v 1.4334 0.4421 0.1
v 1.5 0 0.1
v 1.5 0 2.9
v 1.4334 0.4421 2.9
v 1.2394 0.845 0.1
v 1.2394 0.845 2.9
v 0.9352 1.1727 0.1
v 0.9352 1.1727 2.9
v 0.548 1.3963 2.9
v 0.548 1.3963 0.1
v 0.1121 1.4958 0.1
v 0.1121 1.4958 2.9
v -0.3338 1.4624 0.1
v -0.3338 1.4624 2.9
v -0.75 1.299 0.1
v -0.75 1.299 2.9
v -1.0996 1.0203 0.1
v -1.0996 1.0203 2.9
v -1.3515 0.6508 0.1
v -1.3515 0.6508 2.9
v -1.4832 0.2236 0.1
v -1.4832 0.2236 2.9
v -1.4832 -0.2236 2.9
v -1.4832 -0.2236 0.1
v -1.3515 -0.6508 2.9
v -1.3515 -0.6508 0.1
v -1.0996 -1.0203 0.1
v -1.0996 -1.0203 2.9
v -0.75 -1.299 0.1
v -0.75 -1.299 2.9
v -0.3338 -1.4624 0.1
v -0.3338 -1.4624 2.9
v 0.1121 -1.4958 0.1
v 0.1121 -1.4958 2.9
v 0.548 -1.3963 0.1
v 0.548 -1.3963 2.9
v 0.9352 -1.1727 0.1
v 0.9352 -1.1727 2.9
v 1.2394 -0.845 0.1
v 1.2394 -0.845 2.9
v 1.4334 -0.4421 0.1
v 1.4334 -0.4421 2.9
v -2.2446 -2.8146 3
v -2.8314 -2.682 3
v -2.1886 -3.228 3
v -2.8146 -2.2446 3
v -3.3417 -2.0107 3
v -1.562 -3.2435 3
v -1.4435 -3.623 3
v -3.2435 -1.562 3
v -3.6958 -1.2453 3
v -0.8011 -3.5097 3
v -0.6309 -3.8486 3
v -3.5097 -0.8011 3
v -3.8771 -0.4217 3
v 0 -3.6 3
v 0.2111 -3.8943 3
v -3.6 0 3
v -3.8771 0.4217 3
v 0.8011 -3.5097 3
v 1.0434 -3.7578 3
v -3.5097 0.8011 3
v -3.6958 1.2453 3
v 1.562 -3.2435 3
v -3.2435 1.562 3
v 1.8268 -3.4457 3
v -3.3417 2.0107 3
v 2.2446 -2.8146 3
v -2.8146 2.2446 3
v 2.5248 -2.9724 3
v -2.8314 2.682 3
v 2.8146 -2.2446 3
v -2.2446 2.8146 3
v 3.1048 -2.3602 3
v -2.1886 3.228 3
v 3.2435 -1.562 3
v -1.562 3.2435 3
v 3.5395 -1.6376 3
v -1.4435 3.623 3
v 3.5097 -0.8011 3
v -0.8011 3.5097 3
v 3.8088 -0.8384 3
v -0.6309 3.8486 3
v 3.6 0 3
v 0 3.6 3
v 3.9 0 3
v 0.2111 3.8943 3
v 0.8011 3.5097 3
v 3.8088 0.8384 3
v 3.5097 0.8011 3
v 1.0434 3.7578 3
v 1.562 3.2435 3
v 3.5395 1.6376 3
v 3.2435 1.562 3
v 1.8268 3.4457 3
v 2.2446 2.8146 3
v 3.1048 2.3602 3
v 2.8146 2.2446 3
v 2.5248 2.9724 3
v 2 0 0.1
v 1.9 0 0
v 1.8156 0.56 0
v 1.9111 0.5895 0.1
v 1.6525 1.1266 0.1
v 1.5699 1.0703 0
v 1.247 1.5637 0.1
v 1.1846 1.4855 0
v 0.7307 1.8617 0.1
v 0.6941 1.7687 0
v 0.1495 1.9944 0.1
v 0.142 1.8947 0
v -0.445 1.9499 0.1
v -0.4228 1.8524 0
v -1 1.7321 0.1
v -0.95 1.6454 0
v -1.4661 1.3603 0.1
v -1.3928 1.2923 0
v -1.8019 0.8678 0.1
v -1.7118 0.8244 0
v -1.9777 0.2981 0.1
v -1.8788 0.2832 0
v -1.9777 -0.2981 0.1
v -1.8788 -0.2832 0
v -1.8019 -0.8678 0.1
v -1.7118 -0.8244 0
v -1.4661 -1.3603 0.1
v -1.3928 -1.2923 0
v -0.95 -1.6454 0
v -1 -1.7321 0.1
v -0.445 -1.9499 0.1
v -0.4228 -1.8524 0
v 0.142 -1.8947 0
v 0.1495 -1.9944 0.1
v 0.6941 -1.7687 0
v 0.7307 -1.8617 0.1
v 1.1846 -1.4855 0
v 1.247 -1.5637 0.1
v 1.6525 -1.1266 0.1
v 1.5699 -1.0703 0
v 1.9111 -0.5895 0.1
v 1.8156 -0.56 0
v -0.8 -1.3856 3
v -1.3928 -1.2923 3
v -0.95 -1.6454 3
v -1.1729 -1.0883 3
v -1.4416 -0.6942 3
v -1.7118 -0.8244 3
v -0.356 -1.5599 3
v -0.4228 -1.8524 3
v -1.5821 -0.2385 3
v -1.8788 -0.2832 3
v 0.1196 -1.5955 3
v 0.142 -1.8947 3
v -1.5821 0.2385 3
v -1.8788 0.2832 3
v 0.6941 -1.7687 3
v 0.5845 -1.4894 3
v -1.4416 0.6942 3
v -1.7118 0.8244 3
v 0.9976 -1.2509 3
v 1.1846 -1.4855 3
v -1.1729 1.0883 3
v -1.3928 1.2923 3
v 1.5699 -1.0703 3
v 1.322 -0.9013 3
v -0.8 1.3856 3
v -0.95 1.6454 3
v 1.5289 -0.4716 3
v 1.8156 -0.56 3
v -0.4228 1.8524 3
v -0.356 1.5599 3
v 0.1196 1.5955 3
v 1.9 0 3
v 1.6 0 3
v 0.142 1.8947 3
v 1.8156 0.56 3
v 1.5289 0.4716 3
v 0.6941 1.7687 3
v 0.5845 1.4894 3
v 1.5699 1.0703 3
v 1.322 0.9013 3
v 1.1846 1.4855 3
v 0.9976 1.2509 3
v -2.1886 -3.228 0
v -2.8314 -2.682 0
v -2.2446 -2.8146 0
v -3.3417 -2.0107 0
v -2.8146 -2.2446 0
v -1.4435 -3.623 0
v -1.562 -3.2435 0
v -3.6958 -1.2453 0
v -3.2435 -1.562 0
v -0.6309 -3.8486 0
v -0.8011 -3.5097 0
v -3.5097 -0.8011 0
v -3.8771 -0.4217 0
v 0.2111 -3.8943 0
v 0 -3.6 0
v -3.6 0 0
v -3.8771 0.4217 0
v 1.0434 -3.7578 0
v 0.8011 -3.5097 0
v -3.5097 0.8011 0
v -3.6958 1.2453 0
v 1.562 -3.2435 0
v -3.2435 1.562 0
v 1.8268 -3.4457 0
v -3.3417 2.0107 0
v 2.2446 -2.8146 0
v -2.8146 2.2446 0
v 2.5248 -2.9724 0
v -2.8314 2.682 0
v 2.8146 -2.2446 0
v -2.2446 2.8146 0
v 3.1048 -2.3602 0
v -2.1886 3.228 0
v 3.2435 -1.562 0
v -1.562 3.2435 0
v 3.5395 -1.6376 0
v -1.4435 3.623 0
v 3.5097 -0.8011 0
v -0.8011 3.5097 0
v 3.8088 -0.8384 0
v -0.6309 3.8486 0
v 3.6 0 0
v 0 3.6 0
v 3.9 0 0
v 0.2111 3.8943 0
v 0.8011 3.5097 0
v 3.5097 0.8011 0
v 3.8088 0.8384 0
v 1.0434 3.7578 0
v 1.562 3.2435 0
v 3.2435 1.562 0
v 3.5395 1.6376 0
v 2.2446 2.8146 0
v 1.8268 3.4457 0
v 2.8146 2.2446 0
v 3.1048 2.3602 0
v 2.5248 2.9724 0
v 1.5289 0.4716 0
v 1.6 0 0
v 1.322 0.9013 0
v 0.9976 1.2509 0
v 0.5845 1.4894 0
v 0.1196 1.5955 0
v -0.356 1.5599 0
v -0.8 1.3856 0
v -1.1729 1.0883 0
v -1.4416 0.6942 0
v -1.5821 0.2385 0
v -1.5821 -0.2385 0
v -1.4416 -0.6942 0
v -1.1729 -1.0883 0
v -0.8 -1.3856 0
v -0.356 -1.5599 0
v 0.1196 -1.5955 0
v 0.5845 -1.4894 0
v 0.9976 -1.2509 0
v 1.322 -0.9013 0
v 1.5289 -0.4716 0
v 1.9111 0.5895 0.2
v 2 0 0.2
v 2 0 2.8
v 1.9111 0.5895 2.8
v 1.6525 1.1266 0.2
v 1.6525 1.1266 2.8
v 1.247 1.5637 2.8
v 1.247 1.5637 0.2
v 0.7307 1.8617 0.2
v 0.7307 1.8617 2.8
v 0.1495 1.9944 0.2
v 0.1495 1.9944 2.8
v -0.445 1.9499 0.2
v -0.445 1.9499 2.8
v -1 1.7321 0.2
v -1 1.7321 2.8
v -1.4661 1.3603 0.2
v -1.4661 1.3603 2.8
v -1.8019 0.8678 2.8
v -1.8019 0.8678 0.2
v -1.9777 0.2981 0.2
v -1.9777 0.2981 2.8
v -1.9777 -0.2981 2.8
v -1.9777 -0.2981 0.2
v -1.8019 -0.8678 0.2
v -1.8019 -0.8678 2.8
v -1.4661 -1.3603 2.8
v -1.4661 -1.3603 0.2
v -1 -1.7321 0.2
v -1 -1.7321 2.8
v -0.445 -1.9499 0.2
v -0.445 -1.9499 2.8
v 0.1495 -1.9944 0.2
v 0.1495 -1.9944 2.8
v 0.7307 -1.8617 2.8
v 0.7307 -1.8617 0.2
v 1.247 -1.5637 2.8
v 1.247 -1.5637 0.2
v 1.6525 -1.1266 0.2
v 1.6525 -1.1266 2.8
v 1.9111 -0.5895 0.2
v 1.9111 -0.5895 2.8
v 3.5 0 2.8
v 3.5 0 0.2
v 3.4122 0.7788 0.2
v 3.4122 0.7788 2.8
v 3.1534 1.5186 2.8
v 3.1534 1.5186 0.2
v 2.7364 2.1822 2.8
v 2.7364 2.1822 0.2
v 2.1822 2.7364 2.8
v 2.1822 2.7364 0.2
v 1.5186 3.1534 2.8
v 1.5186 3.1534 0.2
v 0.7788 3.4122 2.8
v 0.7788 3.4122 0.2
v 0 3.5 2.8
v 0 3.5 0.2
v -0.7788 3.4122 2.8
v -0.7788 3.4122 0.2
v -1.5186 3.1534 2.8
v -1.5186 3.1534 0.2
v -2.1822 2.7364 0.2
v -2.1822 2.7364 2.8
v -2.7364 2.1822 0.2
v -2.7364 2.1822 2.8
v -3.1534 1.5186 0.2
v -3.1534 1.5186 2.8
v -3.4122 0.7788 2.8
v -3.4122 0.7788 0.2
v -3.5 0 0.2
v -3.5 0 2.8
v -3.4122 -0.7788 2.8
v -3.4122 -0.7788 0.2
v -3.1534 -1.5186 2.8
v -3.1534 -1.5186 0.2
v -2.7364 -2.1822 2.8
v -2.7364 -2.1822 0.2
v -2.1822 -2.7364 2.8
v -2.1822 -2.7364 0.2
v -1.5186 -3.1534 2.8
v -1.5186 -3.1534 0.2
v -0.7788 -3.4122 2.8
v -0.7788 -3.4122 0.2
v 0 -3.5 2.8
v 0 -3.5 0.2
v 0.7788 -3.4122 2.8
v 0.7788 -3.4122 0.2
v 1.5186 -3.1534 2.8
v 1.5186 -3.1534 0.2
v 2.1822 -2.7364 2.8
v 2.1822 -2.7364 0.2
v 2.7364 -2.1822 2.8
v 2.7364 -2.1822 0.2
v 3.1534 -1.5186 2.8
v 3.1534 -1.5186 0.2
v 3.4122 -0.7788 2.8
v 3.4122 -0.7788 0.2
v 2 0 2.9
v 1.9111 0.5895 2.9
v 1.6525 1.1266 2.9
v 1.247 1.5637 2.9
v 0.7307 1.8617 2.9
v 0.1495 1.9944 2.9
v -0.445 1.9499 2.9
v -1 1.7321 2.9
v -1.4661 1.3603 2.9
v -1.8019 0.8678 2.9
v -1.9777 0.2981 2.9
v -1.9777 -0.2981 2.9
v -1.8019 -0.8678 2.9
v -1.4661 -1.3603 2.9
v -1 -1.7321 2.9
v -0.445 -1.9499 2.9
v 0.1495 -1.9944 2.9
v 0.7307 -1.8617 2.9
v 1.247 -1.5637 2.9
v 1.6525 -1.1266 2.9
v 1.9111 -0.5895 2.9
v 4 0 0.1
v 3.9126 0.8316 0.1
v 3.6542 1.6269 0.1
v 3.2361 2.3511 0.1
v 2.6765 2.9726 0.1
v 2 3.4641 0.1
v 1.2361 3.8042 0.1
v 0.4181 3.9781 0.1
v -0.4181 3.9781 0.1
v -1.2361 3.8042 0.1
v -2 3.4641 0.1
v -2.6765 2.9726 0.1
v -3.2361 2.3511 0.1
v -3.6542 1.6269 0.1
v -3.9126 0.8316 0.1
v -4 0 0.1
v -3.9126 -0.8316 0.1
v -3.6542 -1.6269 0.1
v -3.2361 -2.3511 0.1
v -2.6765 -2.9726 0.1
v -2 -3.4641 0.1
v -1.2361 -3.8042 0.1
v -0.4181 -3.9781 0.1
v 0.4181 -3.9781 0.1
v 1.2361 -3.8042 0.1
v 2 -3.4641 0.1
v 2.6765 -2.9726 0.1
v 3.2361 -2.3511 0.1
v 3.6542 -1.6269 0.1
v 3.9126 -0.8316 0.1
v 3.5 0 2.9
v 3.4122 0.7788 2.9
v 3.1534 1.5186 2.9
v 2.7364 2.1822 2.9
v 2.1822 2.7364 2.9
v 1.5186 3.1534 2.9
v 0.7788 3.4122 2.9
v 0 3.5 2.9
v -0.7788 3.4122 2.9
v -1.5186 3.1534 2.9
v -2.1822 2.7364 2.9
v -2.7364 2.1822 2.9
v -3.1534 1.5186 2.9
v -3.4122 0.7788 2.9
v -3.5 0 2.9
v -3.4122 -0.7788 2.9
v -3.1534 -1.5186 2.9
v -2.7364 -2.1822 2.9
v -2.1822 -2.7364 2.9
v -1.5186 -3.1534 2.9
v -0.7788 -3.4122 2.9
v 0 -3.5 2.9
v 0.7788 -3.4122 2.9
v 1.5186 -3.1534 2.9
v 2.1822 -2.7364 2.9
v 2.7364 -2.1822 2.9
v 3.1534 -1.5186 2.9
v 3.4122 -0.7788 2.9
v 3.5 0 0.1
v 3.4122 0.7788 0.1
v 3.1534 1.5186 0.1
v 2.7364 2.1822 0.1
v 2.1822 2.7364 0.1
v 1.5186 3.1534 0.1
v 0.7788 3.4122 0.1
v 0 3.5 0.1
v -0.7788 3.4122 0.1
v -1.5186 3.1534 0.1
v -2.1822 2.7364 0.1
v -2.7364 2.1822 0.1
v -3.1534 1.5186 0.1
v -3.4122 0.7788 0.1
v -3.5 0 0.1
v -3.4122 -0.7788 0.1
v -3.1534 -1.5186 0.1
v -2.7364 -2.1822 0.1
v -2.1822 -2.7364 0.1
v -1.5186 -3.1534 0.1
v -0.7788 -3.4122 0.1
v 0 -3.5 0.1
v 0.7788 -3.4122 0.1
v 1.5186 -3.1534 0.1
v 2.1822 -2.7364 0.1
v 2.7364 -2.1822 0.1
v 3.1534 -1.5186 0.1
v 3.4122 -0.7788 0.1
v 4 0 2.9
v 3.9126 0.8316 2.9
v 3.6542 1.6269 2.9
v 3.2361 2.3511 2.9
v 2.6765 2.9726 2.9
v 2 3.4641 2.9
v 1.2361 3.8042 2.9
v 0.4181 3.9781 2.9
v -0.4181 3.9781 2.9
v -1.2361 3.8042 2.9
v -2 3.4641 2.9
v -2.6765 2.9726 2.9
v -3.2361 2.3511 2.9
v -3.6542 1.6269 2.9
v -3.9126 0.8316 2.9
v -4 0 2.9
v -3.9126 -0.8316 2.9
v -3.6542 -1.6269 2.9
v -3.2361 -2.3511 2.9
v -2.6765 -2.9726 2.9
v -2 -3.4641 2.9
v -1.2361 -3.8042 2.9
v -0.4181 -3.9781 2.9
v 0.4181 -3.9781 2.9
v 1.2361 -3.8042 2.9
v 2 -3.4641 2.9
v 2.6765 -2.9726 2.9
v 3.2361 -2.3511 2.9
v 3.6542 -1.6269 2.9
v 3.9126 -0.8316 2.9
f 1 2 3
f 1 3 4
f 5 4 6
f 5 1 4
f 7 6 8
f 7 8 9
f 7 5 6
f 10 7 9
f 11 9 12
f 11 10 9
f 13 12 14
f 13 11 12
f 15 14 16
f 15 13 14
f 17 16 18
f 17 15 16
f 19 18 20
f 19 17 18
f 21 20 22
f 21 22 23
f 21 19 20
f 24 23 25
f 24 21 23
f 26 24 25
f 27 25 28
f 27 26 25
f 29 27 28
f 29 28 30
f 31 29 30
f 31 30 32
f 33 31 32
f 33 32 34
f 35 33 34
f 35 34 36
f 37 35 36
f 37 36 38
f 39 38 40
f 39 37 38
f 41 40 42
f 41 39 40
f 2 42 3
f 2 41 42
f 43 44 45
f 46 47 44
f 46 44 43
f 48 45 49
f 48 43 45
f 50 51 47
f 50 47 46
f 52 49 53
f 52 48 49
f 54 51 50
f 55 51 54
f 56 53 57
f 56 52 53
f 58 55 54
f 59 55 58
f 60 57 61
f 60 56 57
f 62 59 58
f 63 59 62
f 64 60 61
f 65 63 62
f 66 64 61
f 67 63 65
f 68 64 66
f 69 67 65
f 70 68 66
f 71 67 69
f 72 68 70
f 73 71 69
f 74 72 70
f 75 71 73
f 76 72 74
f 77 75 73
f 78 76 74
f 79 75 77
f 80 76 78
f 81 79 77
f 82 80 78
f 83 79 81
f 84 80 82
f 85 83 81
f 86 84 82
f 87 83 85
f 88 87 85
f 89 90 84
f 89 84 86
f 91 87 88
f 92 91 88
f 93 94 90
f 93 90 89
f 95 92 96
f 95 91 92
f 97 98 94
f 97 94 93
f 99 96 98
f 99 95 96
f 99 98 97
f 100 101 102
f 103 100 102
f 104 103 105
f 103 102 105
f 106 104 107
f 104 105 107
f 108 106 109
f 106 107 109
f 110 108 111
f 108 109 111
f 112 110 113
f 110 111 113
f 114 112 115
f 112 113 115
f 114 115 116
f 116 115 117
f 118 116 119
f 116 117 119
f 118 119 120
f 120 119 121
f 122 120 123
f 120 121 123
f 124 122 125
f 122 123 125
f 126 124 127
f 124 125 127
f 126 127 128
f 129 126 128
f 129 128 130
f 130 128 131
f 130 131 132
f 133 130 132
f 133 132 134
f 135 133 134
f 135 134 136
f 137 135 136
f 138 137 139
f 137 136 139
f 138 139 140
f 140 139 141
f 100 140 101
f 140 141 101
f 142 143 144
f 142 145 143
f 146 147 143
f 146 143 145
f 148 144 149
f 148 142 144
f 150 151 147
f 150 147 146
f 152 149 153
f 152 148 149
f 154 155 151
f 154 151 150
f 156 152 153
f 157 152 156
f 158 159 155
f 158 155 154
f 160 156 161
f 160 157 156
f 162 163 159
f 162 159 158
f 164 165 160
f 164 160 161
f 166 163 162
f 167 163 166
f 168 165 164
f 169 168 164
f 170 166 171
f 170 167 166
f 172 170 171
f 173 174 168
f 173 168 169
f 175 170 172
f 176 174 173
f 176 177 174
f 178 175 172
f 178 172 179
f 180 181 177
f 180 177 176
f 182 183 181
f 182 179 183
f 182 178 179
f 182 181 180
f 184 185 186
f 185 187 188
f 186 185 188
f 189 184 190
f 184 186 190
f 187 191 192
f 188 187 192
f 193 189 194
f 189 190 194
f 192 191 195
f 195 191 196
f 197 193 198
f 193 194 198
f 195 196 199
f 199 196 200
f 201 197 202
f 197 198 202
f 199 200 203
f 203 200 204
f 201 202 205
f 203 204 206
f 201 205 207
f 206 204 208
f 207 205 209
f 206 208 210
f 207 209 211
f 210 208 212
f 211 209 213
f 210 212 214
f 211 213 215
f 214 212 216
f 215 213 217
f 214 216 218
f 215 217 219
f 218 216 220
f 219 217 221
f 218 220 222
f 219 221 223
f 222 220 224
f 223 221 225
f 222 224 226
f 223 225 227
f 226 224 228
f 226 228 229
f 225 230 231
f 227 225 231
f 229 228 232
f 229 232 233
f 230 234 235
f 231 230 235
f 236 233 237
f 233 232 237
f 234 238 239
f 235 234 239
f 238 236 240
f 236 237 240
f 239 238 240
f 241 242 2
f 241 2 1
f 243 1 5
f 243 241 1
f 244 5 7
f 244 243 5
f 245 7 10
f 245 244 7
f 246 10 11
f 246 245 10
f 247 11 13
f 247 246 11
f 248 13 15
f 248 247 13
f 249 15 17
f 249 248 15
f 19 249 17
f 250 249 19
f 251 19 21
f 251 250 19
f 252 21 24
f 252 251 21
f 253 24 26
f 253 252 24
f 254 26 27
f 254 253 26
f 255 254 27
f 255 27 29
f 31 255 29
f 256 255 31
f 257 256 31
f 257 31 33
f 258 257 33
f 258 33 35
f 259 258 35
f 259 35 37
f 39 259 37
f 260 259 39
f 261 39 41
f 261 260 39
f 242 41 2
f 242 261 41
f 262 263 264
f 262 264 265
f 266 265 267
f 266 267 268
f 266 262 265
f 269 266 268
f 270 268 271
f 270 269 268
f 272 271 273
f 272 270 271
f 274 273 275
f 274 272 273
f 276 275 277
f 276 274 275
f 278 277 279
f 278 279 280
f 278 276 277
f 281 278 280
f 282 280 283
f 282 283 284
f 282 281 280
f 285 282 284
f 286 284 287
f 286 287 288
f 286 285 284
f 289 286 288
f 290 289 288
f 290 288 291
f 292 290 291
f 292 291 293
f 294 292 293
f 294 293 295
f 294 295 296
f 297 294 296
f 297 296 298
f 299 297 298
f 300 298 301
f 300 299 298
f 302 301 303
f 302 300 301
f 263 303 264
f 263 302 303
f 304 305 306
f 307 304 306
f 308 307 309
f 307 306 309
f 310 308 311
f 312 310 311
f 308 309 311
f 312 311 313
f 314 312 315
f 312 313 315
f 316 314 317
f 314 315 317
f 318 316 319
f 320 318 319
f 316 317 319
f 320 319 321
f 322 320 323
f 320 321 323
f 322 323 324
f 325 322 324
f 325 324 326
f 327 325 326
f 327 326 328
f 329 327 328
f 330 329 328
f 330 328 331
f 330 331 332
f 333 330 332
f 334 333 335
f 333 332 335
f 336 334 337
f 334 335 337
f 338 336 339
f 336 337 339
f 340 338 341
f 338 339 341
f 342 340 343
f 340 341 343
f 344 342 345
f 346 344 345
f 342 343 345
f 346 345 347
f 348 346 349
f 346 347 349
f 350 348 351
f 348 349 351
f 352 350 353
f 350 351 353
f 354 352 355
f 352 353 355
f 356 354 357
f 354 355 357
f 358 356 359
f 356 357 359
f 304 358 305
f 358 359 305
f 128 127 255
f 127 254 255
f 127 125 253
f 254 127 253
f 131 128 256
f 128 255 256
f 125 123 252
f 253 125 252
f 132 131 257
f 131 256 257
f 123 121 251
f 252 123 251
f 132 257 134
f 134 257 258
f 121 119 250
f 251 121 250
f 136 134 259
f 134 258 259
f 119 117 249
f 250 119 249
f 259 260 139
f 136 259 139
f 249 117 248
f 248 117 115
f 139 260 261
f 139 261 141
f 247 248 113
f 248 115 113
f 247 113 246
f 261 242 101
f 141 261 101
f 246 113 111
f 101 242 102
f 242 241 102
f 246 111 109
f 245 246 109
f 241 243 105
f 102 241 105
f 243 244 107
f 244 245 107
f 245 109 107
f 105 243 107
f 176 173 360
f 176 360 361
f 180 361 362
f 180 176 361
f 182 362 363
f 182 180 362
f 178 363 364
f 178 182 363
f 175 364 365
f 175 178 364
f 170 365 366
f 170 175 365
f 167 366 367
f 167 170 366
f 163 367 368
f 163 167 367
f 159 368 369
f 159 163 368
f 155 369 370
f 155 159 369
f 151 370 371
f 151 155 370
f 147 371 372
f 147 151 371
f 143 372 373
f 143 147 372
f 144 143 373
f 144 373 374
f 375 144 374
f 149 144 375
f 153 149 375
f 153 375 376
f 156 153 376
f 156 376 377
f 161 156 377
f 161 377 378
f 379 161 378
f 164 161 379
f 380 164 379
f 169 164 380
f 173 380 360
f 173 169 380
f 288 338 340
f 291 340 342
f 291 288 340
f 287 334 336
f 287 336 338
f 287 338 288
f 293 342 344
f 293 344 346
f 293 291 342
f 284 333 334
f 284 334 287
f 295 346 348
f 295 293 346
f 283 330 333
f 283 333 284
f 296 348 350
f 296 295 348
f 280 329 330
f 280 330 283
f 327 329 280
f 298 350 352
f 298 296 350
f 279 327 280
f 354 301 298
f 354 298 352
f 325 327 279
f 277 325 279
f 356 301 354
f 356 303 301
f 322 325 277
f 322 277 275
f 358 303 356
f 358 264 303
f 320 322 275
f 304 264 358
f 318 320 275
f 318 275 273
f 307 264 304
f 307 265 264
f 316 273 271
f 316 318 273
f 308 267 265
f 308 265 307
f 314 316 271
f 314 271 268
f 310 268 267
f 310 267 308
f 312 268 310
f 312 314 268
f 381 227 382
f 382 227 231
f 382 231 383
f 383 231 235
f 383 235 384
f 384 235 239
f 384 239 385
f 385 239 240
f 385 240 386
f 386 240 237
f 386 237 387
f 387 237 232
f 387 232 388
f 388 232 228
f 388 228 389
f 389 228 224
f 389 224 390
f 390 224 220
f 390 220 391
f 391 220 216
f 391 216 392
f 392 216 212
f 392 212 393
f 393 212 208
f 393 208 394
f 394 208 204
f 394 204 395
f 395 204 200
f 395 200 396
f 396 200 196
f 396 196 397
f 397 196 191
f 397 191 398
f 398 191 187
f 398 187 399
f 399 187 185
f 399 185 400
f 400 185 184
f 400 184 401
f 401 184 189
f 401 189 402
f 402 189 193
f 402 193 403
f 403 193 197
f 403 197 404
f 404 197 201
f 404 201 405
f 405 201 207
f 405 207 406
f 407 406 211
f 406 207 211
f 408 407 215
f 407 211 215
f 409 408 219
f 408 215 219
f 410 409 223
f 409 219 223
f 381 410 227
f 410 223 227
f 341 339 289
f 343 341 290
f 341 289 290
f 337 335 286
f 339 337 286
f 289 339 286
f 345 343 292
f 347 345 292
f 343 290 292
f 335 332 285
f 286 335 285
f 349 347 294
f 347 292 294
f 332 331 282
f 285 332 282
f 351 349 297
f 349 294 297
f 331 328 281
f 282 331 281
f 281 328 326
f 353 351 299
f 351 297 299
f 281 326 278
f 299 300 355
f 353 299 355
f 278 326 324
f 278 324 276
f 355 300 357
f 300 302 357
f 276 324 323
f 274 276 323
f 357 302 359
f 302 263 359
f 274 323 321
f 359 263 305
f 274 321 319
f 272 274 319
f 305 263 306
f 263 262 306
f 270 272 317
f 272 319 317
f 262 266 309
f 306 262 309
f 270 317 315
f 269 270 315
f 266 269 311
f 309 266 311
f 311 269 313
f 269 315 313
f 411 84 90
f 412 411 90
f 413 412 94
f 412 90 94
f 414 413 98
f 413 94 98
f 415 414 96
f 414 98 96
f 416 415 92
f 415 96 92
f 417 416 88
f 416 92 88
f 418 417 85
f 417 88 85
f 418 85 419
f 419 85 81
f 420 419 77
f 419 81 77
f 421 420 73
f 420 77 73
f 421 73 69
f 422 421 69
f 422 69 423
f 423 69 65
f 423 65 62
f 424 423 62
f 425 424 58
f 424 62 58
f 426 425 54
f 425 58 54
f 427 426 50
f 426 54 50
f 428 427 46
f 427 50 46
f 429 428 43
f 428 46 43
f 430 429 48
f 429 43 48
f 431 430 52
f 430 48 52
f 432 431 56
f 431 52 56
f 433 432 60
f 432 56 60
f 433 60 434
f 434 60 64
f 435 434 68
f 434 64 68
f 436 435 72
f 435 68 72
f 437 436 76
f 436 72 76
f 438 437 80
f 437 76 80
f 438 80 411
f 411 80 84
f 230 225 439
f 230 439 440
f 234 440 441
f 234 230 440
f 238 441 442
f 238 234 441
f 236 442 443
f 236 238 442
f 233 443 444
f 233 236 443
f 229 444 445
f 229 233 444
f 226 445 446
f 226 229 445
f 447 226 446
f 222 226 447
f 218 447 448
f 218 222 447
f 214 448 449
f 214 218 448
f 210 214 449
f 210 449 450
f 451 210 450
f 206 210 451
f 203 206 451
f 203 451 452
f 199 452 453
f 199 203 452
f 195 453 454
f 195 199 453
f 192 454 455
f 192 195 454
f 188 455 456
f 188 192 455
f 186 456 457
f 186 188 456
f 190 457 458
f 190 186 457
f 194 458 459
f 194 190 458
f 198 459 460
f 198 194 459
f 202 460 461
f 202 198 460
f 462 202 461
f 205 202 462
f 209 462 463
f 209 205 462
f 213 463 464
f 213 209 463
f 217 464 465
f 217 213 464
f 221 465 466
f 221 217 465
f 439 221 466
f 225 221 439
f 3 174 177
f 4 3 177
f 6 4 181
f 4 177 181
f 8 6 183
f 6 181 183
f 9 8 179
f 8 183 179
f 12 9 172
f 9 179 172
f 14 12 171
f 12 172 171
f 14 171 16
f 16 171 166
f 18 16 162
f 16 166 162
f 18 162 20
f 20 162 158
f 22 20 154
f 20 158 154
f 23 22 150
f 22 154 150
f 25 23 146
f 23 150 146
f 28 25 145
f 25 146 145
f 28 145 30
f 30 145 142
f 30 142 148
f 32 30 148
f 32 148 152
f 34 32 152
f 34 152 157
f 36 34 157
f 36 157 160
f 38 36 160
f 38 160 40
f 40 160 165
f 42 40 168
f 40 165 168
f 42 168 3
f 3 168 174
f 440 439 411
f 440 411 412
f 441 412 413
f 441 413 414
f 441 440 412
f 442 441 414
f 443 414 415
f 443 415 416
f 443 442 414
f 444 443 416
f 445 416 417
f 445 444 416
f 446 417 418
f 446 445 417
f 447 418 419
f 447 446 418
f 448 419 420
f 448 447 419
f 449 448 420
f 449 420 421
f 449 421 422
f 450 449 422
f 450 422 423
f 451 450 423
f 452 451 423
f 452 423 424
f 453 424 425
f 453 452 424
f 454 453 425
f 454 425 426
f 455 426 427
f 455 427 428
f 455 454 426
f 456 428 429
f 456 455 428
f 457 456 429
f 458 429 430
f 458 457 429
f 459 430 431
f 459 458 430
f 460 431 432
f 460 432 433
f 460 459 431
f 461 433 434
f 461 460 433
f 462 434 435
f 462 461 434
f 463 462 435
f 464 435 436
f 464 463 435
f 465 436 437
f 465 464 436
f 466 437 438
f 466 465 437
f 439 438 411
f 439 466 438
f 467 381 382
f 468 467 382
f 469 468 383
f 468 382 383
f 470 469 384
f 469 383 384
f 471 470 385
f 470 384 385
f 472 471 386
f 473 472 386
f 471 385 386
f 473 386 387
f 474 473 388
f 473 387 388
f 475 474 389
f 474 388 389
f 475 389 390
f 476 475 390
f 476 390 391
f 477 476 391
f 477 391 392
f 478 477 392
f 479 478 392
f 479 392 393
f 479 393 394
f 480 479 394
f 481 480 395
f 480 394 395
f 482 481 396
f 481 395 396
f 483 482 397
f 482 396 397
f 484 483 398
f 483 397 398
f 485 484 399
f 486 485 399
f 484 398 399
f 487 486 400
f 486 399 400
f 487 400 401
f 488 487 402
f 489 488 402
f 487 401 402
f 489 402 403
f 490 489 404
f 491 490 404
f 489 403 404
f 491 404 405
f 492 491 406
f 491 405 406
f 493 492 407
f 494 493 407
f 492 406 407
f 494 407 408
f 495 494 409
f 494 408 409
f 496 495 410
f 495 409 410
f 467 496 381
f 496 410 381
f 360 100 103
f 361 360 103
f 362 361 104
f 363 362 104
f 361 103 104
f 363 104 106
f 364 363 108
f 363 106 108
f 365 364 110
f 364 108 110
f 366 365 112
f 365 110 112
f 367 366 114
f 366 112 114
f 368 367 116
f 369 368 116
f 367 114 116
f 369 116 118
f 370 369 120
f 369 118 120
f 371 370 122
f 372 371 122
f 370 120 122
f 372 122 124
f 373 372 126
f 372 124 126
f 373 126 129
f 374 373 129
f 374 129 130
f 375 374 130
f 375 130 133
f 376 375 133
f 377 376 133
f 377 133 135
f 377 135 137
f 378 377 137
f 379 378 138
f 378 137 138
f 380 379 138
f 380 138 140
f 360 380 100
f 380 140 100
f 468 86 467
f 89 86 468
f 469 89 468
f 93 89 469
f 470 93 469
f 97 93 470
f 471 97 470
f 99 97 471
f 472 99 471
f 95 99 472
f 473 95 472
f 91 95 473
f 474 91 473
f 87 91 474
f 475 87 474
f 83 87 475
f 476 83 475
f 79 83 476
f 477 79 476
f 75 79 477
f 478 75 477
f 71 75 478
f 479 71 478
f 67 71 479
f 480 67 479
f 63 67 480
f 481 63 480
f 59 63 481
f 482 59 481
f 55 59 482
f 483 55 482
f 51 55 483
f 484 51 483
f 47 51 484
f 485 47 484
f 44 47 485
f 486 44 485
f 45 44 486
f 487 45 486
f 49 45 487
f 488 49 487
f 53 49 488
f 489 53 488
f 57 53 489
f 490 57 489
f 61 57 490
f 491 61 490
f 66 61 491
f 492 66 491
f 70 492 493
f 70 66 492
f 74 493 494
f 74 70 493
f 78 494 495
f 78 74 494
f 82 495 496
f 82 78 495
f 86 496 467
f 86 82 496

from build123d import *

# Parameters (mm, degrees)
F0_R      = 2
F0_R_2    = 1.5
F1_DEPTH  = 3
F0_R_3    = 4
F0_R_4    = 3.5
F2_START  = 0.2
F2_DEPTH  = 2.6
F3_SIZE   = 0.1
F3_2_SIZE = 0.1


with BuildPart() as f1:
    # F0 (on Top) → F1 (new body)
    with BuildSketch(Plane.XY):
        Circle(F0_R)
        Circle(F0_R_2, mode=Mode.SUBTRACT)
    extrude(amount=F1_DEPTH)

    # F3
    f3_edges = [f1.edges().sort_by_distance(p)[0] for p in [
        (-2, 0, 0),
        (-1.5, 0, 0),
        (-2, 0, 3),
        (-1.5, 0, 3),
    ]]
    chamfer(f3_edges, length=F3_SIZE)


with BuildPart() as f1b:
    # F0 (on Top) → F1, piece 2 (new body)
    with BuildSketch(Plane.XY):
        Circle(F0_R_3)
        Circle(F0_R_4, mode=Mode.SUBTRACT)
    extrude(amount=F1_DEPTH)

    # F3#2
    f3_2_edges = [f1b.edges().sort_by_distance(p)[0] for p in [
        (-4, 0, 3),
        (-3.5, 0, 3),
        (-4, 0, 0),
        (-3.5, 0, 0),
    ]]
    chamfer(f3_2_edges, length=F3_2_SIZE)


with BuildPart() as f2:
    # F0 (on Top) → F2 (new body)
    with BuildSketch(Plane.XY.offset(F2_START)):
        Circle(F0_R_4)
        Circle(F0_R, mode=Mode.SUBTRACT)
    extrude(amount=F2_DEPTH)


solid = Compound([f1.part, f1b.part, f2.part])
